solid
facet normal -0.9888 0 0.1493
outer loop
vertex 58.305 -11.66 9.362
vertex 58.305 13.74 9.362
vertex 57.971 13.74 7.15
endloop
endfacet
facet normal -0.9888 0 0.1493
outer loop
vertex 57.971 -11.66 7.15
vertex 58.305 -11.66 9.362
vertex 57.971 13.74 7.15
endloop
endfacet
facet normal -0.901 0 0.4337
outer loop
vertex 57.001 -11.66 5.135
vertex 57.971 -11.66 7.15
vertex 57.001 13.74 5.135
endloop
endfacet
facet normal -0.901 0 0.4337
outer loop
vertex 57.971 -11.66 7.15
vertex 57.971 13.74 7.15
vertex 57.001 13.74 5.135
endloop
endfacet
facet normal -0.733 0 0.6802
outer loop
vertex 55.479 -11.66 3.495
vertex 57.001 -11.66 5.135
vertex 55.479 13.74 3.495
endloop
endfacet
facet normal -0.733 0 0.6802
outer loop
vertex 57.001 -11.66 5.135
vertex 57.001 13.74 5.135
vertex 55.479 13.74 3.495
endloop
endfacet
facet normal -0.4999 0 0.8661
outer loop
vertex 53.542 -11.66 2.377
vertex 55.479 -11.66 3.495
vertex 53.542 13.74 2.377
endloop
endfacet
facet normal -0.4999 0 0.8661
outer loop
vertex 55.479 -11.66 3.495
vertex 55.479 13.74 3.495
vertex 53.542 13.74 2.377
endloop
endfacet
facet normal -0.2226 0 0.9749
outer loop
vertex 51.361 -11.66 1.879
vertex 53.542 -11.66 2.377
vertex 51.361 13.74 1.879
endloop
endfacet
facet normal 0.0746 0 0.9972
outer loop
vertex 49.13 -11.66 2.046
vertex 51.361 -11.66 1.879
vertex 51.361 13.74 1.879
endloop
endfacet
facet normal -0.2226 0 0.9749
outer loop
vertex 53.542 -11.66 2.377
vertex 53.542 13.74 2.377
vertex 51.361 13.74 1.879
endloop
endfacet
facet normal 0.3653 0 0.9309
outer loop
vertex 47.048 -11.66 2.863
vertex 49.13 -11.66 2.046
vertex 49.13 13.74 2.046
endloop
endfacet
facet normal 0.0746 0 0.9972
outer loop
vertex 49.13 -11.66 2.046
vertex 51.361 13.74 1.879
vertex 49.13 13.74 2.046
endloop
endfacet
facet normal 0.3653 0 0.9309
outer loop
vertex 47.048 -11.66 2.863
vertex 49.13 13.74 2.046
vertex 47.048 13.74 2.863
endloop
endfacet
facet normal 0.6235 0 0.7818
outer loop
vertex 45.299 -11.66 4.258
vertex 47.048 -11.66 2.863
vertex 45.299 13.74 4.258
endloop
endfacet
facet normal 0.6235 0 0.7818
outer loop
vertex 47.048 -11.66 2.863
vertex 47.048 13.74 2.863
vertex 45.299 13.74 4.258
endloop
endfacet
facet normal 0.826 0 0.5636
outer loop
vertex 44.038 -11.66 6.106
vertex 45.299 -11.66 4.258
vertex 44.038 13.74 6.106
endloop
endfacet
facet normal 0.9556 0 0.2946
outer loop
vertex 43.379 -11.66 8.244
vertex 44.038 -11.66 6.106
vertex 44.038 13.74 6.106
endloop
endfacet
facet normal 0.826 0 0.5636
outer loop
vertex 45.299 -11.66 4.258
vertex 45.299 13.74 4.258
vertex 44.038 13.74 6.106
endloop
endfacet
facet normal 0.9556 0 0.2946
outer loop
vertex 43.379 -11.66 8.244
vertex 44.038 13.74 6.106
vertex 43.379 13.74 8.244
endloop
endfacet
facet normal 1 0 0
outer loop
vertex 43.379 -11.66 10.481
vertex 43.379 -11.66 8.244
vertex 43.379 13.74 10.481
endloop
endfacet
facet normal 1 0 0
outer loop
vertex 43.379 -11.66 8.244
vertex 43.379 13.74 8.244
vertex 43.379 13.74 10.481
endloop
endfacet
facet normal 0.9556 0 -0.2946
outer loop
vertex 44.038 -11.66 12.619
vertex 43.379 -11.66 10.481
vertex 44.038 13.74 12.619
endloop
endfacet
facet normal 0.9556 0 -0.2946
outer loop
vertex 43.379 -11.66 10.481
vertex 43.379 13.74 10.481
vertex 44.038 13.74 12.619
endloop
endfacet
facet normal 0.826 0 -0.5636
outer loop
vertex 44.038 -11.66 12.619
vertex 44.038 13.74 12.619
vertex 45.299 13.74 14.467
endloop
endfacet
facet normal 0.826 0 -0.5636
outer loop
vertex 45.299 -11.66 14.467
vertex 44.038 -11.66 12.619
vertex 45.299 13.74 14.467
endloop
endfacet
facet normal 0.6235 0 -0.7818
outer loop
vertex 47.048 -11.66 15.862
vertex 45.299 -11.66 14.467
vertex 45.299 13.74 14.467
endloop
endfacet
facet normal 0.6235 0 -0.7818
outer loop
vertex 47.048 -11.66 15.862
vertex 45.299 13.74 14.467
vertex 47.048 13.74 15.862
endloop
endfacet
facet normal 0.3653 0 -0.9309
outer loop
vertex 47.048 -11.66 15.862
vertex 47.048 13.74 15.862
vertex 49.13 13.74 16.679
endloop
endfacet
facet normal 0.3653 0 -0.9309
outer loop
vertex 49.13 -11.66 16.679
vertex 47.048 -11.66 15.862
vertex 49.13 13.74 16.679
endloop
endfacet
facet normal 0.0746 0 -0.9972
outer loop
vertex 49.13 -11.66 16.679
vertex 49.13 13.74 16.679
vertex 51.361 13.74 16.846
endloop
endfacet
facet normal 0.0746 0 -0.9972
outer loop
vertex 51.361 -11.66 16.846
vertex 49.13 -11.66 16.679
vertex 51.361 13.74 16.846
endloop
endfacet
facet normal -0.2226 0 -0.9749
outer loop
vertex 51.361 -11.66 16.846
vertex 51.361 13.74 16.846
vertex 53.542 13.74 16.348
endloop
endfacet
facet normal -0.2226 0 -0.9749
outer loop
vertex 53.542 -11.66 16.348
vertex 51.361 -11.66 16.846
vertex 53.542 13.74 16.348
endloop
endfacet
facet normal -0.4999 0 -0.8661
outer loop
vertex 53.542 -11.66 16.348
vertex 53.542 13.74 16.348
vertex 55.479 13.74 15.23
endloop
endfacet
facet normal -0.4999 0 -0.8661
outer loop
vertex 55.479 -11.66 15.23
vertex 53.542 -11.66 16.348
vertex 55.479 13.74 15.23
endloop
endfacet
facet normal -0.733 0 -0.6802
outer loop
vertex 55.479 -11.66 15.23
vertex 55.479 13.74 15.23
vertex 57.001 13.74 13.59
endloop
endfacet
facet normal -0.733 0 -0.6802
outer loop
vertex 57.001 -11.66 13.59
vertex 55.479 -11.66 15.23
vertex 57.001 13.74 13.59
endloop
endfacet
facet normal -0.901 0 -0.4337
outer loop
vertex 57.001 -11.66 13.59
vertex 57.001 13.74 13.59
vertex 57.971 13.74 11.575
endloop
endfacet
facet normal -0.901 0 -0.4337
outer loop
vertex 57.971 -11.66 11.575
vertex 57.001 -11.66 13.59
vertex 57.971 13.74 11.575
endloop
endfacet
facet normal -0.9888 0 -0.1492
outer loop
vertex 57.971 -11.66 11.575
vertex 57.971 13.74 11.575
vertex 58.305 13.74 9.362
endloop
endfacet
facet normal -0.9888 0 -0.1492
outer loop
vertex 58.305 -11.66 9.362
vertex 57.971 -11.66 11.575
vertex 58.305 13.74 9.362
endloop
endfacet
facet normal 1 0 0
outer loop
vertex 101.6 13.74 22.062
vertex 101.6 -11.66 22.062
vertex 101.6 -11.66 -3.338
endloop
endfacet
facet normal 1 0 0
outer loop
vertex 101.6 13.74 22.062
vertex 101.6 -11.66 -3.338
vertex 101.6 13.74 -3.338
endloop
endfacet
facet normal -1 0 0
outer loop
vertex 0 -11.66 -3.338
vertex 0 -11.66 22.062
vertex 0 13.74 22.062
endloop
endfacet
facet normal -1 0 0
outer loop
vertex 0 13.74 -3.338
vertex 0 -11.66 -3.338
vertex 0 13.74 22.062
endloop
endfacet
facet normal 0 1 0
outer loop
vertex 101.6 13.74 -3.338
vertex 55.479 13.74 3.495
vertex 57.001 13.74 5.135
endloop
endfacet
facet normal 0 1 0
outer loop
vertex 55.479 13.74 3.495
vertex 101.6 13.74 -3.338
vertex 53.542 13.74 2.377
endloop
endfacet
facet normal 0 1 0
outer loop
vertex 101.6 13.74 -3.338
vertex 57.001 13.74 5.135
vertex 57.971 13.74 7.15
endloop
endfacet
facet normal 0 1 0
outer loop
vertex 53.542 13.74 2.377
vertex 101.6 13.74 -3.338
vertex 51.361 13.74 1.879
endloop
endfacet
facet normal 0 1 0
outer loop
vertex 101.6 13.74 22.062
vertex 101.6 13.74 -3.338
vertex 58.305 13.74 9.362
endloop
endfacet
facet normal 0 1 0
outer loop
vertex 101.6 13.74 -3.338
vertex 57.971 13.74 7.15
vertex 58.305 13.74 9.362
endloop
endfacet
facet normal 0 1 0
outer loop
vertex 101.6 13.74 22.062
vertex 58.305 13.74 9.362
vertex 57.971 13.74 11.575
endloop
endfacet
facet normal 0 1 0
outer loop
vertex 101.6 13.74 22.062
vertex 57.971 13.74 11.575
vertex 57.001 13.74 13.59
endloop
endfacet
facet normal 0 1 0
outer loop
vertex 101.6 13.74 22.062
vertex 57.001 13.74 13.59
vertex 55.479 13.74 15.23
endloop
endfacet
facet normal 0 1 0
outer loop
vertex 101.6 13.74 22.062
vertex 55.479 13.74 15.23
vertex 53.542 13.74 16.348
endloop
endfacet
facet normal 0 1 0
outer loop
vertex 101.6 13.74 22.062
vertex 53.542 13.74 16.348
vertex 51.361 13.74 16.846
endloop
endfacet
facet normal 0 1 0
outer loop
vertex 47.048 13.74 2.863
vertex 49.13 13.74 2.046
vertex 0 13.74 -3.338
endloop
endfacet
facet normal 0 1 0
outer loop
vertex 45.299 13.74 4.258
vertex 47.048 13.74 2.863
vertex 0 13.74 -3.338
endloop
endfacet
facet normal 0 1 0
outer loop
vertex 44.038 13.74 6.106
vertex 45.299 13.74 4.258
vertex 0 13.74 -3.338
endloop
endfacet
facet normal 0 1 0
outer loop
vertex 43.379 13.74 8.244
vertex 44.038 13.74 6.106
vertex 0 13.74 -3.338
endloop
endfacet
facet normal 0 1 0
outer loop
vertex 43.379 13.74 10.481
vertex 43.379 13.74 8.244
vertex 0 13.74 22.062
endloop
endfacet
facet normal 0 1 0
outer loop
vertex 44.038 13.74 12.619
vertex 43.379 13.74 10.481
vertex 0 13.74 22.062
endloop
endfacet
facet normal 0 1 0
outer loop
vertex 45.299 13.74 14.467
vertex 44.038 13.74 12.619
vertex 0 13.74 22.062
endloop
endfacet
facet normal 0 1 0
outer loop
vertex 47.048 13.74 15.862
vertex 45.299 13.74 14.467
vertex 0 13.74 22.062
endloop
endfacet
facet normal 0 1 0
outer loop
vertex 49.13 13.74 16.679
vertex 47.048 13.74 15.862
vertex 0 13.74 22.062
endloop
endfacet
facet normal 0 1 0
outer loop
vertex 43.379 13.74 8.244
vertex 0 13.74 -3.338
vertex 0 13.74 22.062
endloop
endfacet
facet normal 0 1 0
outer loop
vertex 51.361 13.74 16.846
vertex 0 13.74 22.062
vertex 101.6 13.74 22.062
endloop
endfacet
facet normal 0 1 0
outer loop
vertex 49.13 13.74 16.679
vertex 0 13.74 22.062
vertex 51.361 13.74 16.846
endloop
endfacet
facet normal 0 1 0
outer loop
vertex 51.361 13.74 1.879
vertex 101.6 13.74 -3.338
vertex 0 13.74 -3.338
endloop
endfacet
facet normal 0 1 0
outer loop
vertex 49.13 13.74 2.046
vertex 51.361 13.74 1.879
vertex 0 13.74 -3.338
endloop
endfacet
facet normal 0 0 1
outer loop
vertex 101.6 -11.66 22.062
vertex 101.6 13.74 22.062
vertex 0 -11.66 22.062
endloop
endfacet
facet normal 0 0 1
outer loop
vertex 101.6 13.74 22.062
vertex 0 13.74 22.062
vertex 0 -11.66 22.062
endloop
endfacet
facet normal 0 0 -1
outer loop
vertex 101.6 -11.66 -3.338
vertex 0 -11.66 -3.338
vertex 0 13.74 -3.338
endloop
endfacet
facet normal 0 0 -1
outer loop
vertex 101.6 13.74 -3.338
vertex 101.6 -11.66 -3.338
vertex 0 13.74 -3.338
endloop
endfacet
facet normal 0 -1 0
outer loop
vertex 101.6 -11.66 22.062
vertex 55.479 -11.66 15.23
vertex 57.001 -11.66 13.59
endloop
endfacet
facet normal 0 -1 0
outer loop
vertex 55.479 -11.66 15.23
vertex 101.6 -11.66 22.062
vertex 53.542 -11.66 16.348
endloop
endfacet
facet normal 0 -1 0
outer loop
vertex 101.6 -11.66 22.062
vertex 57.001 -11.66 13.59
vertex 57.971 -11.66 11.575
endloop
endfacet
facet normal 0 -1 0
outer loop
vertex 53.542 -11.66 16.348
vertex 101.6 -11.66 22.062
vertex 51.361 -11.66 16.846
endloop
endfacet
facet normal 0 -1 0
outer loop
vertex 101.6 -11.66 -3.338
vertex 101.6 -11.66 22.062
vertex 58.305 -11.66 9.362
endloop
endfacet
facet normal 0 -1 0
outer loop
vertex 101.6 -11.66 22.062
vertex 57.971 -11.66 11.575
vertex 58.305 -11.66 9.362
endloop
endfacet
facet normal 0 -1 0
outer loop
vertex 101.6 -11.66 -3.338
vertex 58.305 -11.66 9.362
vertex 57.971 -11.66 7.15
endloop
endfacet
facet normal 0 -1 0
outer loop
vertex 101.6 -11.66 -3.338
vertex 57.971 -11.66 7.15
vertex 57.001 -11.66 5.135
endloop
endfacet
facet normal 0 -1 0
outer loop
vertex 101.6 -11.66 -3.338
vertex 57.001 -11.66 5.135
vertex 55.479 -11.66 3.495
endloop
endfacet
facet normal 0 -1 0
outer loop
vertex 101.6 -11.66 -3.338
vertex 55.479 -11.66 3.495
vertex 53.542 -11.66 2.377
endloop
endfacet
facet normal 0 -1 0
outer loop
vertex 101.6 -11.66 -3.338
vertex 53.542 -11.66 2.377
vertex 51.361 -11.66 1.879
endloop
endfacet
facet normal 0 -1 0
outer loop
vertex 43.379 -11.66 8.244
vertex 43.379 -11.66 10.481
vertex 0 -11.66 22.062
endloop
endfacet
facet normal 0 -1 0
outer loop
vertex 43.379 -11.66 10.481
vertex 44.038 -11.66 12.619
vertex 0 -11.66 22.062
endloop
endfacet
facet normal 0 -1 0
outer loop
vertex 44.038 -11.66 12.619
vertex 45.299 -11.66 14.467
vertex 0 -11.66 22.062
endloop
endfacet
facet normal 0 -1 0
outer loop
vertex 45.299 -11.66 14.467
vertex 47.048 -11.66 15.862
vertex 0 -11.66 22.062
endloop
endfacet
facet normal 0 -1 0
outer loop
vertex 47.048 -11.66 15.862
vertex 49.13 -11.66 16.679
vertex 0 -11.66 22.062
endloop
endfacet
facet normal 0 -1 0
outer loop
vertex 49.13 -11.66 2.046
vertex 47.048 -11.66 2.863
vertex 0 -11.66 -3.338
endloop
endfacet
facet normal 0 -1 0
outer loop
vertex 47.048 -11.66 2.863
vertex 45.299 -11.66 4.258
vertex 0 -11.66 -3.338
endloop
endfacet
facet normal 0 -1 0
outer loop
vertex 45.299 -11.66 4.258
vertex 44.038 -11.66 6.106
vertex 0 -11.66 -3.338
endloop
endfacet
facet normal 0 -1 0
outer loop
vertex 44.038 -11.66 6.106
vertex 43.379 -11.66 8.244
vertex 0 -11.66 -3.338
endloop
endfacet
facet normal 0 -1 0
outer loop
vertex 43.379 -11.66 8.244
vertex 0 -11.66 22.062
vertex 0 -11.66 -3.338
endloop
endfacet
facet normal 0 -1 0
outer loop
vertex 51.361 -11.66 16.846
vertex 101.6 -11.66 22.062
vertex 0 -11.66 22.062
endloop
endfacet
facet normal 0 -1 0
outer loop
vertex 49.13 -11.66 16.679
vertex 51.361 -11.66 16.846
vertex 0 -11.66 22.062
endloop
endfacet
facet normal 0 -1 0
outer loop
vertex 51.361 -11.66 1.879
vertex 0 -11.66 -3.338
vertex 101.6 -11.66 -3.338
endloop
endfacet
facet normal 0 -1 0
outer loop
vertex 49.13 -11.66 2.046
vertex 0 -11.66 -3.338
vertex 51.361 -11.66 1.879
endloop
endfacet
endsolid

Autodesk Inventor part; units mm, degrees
ref_plane "YZ Plane" through (0, 0, 0) normal (1, 0, 0) x (0, 1, 0)
ref_plane "XZ Plane" through (0, 0, 0) normal (0, 1, 0) x (-1, 0, 0)
ref_plane "XY Plane" through (0, 0, 0) normal (0, 0, 1) x (1, 0, 0)
sketch "Sketch1" plane through (0, 0, 0) normal (1, 0, 0) x (0, 1, 0)
  line L0 (13.7403, 22.0625) -> (-11.6597, 22.0625)
  line L1 (-11.6597, 22.0625) -> (-11.6597, -3.3375)
  line L2 (-11.6597, -3.3375) -> (13.7403, -3.3375)
  line L3 (13.7403, -3.3375) -> (13.7403, 22.0625)
  point P0 (0, 0)
  dimension "d0" = 25.4
  dimension "d1" = 25.4
extrude "Extrusion1" add sketch "Sketch1" along normal blind 101.6
sketch "Sketch2" plane through (0, 13.7403, 22.0625) normal (0, 1, 0) x (1, 0, 0)
  circle A0 centre (50.8, 12.7) radius 7.5047
  line L0 (0, 25.4) -> (0, 0) projected
  line L1 (0, 25.4) -> (101.6, 25.4) projected
  point P0 (0, 22.0625)
  dimension "d4" = 50.8
  dimension "d5" = 12.7
extrude "Extrusion2" cut sketch "Sketch2" against normal blind 101.6
properties part number "ServoBlock"
